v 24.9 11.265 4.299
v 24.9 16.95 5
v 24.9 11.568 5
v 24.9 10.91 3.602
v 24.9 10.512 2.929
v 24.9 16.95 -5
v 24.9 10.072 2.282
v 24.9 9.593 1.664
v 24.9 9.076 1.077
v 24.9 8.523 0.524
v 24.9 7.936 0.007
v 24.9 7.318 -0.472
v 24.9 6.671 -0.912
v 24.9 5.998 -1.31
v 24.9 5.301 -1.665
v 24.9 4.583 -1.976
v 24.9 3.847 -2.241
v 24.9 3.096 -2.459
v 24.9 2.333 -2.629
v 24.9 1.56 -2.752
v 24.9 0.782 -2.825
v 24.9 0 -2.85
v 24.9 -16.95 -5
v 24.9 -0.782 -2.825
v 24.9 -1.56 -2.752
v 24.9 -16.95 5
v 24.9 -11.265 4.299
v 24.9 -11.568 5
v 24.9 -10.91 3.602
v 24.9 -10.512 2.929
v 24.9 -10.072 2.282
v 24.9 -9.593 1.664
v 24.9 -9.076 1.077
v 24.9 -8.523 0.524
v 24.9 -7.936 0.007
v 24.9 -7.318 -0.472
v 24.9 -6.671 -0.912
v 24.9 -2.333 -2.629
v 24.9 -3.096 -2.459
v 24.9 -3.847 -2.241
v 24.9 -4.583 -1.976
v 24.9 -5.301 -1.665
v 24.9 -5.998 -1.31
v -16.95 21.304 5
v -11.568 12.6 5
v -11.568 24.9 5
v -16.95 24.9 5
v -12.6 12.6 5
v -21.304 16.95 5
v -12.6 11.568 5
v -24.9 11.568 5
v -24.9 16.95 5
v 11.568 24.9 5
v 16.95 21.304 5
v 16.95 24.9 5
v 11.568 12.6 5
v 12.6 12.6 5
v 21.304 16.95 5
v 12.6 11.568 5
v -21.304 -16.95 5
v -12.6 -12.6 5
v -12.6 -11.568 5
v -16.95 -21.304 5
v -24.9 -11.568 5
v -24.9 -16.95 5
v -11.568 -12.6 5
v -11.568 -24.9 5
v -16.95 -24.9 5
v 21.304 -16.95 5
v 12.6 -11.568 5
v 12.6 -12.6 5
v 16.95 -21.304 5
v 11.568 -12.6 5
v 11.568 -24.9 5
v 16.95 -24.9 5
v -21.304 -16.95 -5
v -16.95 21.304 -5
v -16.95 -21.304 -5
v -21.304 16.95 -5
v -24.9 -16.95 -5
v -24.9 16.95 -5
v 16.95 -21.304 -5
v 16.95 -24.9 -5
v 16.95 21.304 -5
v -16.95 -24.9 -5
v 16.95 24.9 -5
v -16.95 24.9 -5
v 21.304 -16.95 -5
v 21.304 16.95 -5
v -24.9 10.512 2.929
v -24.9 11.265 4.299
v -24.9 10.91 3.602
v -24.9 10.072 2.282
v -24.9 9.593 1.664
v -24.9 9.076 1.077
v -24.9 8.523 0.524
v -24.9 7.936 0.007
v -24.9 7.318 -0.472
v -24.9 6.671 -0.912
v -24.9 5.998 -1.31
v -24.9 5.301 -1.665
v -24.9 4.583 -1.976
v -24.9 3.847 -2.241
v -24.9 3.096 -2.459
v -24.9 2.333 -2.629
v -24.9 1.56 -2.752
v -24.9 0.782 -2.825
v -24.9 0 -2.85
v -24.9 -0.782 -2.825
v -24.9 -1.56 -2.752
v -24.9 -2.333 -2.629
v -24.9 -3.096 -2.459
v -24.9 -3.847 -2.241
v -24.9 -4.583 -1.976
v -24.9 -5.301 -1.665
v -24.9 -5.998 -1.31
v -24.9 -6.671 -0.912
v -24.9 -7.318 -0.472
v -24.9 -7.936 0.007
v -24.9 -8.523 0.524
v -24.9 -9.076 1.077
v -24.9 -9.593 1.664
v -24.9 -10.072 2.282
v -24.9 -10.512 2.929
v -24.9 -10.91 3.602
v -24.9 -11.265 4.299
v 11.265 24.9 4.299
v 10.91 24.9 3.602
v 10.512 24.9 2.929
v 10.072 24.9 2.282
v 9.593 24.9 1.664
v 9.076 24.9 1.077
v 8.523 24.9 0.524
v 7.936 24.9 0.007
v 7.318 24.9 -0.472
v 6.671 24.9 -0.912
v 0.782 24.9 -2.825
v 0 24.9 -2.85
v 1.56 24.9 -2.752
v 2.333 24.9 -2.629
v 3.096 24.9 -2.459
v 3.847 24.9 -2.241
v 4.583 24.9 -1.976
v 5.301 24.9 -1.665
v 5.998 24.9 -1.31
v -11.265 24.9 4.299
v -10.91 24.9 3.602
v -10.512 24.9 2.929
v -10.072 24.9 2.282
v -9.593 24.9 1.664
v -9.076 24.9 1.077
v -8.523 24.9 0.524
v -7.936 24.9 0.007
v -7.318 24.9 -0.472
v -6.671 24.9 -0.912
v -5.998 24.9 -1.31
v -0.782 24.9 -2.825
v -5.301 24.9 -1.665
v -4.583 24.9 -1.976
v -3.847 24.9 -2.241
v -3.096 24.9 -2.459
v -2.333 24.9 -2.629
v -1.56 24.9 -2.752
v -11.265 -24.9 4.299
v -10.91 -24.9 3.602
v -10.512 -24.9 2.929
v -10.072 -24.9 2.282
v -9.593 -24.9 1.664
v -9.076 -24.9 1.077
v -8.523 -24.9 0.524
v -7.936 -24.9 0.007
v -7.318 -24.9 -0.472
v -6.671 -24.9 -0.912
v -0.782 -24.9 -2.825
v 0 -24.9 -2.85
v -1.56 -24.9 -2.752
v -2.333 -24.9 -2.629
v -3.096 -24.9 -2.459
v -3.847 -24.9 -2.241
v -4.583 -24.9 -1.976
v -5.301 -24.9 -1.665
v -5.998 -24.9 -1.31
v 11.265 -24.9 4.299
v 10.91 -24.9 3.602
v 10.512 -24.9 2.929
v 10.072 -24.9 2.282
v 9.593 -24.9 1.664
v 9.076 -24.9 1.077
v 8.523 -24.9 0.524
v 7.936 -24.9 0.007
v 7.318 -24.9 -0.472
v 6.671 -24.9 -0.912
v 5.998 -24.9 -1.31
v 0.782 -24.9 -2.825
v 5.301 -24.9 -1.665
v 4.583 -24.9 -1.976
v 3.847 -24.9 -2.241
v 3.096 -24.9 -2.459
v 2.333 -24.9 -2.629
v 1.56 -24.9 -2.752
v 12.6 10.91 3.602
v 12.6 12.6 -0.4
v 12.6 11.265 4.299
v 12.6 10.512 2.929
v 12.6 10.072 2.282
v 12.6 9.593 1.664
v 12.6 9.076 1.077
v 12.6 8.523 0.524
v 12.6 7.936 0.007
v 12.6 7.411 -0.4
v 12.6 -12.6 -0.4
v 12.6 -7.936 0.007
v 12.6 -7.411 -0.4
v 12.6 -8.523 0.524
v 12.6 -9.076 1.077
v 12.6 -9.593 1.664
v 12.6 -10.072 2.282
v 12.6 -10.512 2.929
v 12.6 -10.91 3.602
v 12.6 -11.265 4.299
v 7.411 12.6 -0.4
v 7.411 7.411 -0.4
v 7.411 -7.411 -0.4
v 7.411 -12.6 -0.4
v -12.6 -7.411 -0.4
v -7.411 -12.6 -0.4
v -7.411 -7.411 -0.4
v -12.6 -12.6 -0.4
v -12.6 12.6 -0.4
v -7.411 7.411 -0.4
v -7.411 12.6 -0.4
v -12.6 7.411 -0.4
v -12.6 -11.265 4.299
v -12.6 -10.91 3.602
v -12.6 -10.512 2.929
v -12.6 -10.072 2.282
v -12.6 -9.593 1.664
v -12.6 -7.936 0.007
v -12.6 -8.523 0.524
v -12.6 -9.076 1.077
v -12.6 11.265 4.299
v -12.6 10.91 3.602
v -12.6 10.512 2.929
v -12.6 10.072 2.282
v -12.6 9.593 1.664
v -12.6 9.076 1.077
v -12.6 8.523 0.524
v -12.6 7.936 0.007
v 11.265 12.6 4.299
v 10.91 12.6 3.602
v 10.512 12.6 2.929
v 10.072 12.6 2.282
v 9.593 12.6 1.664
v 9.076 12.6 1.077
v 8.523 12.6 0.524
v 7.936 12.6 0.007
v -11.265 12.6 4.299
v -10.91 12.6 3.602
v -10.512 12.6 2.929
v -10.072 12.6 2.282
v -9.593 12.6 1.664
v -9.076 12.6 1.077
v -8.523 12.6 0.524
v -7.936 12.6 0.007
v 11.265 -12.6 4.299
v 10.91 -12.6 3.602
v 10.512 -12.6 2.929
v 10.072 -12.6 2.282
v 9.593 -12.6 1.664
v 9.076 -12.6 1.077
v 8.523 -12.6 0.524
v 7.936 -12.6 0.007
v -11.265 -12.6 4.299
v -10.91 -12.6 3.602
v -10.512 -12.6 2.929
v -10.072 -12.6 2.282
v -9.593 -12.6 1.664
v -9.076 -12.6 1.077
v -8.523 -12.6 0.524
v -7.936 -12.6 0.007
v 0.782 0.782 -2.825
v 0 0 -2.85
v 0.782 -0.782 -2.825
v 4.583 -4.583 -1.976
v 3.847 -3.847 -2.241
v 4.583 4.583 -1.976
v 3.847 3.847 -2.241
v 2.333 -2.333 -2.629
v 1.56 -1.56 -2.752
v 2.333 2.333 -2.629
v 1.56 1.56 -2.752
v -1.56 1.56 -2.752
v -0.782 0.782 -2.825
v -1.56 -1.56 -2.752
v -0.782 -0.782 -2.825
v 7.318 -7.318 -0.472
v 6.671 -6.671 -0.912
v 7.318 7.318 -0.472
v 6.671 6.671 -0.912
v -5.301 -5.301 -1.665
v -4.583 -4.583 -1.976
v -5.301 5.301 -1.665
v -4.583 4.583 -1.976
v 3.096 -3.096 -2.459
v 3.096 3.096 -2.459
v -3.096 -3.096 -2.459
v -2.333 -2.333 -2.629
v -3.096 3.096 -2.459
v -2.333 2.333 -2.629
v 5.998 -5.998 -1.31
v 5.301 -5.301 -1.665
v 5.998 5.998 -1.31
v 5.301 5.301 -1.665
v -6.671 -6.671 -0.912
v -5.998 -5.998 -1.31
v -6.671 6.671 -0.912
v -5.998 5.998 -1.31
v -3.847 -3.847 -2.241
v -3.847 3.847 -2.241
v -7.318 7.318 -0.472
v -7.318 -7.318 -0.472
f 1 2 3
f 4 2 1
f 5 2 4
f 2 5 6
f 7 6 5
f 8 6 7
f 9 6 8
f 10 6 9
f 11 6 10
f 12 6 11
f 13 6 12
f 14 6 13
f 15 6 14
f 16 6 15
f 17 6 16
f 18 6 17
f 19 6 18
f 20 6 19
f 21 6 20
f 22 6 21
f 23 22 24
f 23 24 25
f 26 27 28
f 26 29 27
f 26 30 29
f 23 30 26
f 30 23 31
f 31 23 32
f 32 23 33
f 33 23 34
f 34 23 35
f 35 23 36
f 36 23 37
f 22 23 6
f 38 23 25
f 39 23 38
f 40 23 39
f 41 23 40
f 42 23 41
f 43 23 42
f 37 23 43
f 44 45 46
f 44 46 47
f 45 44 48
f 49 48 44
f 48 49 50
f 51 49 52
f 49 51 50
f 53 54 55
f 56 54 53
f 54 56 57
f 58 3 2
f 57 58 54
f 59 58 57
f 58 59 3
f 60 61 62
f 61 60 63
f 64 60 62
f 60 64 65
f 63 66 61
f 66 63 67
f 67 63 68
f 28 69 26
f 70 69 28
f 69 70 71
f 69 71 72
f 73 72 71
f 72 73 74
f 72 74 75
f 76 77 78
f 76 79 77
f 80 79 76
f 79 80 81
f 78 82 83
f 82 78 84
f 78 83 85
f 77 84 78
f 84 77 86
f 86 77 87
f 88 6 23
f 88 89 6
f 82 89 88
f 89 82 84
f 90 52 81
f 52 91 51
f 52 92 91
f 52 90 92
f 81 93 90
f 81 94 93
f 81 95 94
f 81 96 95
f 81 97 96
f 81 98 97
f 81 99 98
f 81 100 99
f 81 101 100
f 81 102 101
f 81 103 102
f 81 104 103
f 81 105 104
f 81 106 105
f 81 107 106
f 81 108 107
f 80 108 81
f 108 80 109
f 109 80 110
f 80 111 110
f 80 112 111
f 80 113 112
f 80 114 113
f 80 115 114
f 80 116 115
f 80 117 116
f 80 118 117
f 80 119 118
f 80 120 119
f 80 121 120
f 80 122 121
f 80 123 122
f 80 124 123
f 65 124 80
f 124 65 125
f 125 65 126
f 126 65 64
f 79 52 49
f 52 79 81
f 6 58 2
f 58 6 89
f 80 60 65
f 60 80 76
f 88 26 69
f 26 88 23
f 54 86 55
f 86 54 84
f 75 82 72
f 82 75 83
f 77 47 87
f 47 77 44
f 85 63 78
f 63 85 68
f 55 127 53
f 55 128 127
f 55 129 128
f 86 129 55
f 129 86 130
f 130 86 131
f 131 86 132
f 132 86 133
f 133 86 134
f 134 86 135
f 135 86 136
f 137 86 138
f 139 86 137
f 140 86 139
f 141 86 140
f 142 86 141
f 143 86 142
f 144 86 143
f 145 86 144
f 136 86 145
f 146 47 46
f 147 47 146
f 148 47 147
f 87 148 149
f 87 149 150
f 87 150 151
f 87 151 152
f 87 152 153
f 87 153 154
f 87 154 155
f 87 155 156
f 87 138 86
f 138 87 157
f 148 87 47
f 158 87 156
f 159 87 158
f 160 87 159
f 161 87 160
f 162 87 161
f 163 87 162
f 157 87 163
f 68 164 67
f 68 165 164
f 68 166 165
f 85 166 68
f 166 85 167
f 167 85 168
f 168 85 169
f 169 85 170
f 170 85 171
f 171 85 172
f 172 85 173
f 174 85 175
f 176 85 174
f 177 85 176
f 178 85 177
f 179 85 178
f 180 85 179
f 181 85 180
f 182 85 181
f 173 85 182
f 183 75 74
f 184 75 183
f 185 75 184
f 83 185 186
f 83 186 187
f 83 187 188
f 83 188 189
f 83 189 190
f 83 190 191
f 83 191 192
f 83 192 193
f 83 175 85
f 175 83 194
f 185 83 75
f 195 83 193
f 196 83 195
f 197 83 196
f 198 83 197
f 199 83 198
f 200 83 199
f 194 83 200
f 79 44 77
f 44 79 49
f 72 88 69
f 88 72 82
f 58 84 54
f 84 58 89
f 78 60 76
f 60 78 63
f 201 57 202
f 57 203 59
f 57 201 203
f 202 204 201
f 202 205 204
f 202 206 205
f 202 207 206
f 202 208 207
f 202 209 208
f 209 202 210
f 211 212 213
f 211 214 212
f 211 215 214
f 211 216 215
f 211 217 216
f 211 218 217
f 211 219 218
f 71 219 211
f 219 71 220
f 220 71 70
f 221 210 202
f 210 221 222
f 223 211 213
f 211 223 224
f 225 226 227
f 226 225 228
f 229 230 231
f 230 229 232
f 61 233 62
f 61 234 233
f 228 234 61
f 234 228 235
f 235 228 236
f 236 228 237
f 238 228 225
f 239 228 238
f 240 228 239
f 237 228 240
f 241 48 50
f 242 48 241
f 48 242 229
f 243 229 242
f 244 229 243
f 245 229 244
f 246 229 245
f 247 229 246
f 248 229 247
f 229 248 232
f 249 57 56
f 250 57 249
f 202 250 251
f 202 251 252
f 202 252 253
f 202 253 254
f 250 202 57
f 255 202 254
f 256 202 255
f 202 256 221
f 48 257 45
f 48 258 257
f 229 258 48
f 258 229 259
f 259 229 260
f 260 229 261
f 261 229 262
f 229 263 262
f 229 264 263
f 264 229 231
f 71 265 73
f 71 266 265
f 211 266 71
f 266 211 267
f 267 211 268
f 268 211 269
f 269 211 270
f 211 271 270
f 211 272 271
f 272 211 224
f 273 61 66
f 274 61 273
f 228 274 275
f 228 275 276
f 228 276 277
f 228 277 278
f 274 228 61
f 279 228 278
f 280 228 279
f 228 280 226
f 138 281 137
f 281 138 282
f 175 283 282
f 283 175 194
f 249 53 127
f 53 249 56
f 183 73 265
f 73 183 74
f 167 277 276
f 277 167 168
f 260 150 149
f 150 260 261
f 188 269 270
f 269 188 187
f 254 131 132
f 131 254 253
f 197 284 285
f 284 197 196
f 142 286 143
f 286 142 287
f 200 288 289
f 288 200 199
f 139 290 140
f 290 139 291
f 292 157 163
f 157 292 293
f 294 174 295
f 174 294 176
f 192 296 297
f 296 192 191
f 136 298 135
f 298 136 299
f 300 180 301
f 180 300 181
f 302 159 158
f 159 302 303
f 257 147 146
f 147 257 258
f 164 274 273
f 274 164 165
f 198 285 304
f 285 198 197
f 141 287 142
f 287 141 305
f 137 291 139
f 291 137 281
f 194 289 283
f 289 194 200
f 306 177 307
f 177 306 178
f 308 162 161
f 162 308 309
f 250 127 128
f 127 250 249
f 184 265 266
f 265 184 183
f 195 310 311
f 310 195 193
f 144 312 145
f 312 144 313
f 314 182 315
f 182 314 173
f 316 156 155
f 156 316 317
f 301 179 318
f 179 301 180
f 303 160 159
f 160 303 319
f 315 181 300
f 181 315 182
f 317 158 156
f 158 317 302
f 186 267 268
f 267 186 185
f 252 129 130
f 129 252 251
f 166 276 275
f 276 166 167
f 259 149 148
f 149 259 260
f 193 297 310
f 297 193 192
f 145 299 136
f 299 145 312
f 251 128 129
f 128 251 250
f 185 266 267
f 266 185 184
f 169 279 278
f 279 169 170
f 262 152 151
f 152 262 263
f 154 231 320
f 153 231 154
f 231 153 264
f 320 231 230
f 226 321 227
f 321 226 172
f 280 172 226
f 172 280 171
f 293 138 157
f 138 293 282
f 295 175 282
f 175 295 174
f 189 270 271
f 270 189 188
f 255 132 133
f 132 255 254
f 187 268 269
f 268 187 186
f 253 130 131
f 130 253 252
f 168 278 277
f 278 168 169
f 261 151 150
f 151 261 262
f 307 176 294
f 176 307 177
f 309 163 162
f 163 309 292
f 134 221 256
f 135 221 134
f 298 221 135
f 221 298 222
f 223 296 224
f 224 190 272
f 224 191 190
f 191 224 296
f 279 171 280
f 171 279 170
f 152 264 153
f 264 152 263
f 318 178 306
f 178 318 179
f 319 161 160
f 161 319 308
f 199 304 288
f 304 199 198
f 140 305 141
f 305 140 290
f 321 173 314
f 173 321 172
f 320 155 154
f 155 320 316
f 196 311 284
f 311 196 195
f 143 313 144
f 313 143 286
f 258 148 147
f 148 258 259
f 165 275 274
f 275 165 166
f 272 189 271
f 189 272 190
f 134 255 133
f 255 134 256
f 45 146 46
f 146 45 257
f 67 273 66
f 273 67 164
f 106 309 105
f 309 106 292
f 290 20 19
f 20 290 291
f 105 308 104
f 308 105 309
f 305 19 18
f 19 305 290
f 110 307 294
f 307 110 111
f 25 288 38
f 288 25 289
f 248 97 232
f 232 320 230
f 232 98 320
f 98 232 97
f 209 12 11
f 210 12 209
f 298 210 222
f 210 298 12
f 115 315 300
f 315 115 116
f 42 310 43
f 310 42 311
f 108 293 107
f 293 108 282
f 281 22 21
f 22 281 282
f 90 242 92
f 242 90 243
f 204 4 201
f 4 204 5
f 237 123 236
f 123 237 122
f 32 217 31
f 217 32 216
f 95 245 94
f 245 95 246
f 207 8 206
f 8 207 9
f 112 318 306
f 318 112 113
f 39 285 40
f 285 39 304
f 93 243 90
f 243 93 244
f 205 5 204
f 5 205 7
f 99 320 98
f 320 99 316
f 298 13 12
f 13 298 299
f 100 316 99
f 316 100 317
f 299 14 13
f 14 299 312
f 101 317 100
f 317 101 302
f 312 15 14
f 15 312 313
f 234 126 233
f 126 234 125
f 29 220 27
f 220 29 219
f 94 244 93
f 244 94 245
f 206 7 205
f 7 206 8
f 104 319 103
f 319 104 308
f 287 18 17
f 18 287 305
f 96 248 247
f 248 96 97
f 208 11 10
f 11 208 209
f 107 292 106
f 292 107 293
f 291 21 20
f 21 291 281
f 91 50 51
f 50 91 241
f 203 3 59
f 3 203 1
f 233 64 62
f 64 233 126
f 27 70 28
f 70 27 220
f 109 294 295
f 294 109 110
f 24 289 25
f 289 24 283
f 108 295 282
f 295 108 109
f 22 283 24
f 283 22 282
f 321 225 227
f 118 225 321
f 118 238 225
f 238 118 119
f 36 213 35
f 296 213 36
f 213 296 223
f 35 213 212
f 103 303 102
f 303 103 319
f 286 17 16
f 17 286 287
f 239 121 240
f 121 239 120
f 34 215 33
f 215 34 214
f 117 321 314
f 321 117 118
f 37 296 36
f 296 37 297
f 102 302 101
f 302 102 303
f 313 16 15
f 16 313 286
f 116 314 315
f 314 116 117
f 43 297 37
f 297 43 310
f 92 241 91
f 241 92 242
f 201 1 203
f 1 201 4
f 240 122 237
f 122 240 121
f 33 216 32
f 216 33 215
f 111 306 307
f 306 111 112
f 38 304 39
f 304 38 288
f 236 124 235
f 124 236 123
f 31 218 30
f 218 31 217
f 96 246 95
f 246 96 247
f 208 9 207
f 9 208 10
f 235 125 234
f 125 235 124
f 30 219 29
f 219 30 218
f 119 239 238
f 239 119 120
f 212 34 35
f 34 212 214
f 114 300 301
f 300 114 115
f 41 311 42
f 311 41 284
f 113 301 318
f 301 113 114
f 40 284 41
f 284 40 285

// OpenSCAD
//Beam splitter cube holder

bs_side = 24.9;
clamp_h = 2;
cube_win_side = 34.1;

/* [Hiden] */
a = 49.8;
b = 33.6;
c = 6.28;
d = 53.8;

h = 10; //holder height
FDM_offset = 0.15;

module BSInsert () {
    
    difference(){
        //basic insert design
        union() {   
            cube([a,b+2*FDM_offset,h], center=true);
            cube([b+2*FDM_offset,a,h], center=true);
            rotate(a=[0,0,45])
                cube([c,d+2*FDM_offset,h], center=true);
            rotate(a=[0,0,-45])
                cube([c,d+2*FDM_offset,h], center=true);
        }
        bs_shift = cube_win_side/2-bs_side/2+5;
        translate([0,0,bs_shift])
            cube([bs_side+2*FDM_offset, bs_side+2*FDM_offset, 20], center=true);
        rotate([90,0,0])
        translate([0,bs_shift,0])
            cylinder(d = bs_side, h = 60, center=true, $fn=100);
        rotate([0,90,0])
        translate([-bs_shift,0,0])
            cylinder(d = bs_side, h = 60, center=true, $fn=100);
    }
}

BSInsert();
